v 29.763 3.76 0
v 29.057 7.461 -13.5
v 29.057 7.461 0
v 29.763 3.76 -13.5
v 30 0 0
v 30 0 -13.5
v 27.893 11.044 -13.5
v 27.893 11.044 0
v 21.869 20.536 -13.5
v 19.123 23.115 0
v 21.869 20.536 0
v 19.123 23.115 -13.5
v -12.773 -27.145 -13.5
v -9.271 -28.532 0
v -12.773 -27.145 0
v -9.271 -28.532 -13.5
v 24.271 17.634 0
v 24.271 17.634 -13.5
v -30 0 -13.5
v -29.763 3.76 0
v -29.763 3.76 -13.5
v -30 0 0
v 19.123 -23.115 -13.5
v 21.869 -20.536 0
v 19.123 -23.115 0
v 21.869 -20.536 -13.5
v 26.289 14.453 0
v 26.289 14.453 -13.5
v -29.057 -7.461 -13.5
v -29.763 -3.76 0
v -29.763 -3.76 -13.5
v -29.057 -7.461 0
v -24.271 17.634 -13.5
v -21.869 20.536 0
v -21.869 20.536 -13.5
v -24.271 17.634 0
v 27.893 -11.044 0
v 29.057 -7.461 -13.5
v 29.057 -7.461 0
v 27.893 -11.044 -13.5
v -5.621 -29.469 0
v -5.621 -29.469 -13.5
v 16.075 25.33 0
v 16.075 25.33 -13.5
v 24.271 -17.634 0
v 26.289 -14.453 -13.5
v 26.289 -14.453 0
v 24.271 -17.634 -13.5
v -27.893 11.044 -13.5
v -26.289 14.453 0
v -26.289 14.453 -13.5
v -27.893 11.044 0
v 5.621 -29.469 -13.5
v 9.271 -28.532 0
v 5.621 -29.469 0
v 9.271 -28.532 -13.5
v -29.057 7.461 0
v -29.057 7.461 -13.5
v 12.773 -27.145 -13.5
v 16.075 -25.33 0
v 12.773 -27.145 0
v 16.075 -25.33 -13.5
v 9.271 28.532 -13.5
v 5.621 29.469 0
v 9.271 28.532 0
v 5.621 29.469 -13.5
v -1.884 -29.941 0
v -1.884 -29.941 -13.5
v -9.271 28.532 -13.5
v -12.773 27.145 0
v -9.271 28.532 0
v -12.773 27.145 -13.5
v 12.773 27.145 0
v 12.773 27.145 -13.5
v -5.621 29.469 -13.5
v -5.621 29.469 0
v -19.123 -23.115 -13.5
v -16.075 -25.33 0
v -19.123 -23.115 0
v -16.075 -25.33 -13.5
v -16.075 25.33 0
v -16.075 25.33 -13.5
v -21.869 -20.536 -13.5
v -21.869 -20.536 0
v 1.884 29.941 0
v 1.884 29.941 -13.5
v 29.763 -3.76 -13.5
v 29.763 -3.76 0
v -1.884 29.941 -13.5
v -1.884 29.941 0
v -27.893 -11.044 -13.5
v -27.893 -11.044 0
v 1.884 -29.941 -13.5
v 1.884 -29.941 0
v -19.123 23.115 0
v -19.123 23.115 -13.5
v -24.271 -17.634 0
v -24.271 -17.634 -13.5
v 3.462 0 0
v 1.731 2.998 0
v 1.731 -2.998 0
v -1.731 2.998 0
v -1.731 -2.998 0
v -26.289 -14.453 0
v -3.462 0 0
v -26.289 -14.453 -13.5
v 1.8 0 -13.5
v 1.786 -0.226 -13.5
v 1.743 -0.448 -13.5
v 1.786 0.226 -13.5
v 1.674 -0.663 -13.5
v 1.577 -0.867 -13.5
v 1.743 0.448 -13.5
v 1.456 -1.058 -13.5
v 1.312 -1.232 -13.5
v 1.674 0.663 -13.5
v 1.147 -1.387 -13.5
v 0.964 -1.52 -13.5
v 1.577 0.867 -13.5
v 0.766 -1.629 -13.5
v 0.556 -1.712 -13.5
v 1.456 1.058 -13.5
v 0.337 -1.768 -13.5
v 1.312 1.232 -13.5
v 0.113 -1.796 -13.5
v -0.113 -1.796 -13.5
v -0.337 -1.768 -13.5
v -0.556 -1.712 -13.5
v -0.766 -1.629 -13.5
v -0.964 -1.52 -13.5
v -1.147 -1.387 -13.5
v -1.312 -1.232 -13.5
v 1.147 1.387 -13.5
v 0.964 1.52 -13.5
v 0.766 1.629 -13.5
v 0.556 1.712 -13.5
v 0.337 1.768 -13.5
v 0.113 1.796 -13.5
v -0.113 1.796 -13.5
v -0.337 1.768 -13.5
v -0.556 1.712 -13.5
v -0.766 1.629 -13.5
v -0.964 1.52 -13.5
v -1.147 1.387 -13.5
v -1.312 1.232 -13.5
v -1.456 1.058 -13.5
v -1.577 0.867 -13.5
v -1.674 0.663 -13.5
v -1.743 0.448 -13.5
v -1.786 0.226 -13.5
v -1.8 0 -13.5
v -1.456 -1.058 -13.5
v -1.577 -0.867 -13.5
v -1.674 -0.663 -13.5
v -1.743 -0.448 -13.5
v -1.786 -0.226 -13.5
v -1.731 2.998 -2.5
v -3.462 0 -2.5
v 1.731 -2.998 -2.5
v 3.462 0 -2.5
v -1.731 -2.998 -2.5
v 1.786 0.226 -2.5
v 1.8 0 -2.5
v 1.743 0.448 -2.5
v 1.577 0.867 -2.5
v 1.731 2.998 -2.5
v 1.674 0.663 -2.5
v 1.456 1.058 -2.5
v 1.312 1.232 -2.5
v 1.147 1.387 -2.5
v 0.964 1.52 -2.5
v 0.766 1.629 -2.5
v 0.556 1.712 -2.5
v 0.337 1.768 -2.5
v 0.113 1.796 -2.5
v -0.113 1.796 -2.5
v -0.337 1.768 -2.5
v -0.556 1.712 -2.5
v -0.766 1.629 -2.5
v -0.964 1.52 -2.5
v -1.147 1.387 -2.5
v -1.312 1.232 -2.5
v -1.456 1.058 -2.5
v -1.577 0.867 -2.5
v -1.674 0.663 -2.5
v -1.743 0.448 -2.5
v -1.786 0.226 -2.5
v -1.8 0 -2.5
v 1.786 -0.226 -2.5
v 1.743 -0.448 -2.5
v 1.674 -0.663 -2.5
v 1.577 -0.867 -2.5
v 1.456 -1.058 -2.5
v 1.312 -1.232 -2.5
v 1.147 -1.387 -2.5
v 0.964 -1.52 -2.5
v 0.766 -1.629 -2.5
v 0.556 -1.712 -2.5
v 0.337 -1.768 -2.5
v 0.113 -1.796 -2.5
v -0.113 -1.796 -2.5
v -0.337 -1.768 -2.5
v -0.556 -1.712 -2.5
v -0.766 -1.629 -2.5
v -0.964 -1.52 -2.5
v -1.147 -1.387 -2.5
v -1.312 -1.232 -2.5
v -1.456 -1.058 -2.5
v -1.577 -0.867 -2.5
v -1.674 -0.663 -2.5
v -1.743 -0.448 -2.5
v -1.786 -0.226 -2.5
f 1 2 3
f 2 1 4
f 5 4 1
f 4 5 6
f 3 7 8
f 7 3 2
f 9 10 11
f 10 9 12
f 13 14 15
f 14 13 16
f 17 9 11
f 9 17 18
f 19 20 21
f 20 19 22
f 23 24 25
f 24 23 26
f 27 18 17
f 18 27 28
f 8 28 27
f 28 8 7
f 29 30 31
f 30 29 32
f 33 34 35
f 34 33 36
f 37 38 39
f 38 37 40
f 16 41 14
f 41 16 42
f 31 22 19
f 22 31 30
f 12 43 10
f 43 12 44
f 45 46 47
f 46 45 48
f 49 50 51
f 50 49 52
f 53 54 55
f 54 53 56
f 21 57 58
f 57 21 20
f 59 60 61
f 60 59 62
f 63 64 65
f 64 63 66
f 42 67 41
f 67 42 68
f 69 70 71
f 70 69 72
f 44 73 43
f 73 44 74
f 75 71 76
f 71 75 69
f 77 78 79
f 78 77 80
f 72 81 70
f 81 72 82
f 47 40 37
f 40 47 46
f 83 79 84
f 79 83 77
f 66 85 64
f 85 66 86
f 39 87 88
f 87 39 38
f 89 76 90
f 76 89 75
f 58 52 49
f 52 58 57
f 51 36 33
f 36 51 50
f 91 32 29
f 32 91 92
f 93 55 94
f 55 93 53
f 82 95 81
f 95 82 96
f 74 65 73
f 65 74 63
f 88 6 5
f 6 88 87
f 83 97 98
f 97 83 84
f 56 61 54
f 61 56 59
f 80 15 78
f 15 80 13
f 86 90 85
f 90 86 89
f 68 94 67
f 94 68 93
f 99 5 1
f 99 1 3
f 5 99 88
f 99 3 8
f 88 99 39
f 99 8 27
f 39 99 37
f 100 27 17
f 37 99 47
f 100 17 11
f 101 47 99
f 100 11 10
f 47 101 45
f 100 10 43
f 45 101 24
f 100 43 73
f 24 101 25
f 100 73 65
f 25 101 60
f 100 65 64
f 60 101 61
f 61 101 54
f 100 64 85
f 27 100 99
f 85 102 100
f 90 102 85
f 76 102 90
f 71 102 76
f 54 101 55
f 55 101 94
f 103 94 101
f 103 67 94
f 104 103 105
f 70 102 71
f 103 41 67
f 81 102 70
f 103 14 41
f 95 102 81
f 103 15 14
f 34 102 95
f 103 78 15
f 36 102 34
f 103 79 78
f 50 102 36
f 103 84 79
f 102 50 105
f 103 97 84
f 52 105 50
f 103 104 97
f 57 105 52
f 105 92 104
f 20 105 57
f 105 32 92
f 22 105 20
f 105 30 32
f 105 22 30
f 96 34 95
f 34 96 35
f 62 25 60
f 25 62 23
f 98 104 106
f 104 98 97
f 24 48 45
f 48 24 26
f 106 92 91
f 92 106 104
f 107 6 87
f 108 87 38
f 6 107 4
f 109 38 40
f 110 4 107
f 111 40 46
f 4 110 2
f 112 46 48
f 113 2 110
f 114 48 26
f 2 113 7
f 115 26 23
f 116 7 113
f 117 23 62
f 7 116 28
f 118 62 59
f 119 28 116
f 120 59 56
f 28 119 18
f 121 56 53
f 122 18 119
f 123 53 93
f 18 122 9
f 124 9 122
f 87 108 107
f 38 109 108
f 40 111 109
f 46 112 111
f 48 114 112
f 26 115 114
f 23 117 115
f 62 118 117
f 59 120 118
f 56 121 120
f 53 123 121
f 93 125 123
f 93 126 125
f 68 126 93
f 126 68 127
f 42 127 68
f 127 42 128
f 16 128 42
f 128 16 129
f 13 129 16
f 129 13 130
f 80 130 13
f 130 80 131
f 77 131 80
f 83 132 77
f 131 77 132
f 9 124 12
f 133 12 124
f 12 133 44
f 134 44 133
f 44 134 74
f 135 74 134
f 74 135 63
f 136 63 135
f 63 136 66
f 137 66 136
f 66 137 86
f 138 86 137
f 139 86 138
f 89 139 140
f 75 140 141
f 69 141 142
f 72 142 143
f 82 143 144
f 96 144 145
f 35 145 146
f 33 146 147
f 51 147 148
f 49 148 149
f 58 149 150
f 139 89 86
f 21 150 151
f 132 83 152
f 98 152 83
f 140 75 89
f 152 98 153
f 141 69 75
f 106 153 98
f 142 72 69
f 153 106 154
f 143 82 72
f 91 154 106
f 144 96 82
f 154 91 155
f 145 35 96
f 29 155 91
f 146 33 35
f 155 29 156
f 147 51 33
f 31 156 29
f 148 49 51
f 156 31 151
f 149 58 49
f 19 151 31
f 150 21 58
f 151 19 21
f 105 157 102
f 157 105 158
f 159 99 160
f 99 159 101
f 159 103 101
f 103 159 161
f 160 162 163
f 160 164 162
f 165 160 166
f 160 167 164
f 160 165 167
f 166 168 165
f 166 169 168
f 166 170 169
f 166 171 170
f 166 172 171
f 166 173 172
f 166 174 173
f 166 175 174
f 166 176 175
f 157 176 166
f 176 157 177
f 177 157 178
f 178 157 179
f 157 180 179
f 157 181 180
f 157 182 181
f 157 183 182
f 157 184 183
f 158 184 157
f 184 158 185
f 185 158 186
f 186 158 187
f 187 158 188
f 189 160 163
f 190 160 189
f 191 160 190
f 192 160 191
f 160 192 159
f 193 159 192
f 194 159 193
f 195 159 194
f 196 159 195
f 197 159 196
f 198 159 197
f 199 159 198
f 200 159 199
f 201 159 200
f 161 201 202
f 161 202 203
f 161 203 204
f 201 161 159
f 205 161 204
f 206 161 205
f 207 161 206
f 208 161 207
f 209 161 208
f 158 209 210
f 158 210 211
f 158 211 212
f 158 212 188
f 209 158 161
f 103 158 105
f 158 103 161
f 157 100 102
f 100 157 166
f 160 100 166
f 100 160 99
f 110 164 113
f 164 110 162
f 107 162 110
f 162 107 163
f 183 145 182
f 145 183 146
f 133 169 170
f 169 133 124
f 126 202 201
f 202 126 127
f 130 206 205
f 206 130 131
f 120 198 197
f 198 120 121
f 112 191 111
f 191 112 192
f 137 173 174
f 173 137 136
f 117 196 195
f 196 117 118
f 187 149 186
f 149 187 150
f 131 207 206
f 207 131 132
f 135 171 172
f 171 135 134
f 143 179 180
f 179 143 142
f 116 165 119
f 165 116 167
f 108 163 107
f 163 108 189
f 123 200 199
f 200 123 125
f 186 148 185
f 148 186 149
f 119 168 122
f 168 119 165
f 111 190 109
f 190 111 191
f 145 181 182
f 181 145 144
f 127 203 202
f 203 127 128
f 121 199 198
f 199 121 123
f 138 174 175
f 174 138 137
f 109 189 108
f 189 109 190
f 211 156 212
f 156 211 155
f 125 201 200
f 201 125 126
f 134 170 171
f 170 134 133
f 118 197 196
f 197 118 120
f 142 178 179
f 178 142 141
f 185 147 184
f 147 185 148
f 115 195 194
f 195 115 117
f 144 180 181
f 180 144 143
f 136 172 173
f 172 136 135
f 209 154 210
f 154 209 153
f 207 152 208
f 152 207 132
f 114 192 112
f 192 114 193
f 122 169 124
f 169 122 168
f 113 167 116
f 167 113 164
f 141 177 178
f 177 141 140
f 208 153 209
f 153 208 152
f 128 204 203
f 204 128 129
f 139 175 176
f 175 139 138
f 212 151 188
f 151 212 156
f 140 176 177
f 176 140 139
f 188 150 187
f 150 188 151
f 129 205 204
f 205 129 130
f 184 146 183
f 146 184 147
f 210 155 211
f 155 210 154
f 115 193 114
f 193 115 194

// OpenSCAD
$fn = 50;


difference() {
	union() {
		translate(v = [0, 0, -13.5000000000]) {
			cylinder(h = 13.5000000000, r = 30.0000000000);
		}
		translate(v = [0, 0, -12.0000000000]) {
			cylinder(h = 12, r = 2.8750000000);
		}
	}
	union() {
		translate(v = [0, 0, 0]) {
			rotate(a = [0, 0, 0]) {
				difference() {
					union() {
						translate(v = [0, 0, -2.5000000000]) {
							linear_extrude(height = 2.5000000000) {
								polygon(points = [[3.4620000000, 0.0000000000], [1.7310000000, 2.9981799479], [-1.7310000000, 2.9981799479], [-3.4620000000, 0.0000000000], [-1.7310000000, -2.9981799479], [1.7310000000, -2.9981799479]]);
							}
						}
					}
					union();
				}
			}
		}
		#translate(v = [0, 0, -100.0000000000]) {
			cylinder(h = 200, r = 1.8000000000);
		}
	}
}
